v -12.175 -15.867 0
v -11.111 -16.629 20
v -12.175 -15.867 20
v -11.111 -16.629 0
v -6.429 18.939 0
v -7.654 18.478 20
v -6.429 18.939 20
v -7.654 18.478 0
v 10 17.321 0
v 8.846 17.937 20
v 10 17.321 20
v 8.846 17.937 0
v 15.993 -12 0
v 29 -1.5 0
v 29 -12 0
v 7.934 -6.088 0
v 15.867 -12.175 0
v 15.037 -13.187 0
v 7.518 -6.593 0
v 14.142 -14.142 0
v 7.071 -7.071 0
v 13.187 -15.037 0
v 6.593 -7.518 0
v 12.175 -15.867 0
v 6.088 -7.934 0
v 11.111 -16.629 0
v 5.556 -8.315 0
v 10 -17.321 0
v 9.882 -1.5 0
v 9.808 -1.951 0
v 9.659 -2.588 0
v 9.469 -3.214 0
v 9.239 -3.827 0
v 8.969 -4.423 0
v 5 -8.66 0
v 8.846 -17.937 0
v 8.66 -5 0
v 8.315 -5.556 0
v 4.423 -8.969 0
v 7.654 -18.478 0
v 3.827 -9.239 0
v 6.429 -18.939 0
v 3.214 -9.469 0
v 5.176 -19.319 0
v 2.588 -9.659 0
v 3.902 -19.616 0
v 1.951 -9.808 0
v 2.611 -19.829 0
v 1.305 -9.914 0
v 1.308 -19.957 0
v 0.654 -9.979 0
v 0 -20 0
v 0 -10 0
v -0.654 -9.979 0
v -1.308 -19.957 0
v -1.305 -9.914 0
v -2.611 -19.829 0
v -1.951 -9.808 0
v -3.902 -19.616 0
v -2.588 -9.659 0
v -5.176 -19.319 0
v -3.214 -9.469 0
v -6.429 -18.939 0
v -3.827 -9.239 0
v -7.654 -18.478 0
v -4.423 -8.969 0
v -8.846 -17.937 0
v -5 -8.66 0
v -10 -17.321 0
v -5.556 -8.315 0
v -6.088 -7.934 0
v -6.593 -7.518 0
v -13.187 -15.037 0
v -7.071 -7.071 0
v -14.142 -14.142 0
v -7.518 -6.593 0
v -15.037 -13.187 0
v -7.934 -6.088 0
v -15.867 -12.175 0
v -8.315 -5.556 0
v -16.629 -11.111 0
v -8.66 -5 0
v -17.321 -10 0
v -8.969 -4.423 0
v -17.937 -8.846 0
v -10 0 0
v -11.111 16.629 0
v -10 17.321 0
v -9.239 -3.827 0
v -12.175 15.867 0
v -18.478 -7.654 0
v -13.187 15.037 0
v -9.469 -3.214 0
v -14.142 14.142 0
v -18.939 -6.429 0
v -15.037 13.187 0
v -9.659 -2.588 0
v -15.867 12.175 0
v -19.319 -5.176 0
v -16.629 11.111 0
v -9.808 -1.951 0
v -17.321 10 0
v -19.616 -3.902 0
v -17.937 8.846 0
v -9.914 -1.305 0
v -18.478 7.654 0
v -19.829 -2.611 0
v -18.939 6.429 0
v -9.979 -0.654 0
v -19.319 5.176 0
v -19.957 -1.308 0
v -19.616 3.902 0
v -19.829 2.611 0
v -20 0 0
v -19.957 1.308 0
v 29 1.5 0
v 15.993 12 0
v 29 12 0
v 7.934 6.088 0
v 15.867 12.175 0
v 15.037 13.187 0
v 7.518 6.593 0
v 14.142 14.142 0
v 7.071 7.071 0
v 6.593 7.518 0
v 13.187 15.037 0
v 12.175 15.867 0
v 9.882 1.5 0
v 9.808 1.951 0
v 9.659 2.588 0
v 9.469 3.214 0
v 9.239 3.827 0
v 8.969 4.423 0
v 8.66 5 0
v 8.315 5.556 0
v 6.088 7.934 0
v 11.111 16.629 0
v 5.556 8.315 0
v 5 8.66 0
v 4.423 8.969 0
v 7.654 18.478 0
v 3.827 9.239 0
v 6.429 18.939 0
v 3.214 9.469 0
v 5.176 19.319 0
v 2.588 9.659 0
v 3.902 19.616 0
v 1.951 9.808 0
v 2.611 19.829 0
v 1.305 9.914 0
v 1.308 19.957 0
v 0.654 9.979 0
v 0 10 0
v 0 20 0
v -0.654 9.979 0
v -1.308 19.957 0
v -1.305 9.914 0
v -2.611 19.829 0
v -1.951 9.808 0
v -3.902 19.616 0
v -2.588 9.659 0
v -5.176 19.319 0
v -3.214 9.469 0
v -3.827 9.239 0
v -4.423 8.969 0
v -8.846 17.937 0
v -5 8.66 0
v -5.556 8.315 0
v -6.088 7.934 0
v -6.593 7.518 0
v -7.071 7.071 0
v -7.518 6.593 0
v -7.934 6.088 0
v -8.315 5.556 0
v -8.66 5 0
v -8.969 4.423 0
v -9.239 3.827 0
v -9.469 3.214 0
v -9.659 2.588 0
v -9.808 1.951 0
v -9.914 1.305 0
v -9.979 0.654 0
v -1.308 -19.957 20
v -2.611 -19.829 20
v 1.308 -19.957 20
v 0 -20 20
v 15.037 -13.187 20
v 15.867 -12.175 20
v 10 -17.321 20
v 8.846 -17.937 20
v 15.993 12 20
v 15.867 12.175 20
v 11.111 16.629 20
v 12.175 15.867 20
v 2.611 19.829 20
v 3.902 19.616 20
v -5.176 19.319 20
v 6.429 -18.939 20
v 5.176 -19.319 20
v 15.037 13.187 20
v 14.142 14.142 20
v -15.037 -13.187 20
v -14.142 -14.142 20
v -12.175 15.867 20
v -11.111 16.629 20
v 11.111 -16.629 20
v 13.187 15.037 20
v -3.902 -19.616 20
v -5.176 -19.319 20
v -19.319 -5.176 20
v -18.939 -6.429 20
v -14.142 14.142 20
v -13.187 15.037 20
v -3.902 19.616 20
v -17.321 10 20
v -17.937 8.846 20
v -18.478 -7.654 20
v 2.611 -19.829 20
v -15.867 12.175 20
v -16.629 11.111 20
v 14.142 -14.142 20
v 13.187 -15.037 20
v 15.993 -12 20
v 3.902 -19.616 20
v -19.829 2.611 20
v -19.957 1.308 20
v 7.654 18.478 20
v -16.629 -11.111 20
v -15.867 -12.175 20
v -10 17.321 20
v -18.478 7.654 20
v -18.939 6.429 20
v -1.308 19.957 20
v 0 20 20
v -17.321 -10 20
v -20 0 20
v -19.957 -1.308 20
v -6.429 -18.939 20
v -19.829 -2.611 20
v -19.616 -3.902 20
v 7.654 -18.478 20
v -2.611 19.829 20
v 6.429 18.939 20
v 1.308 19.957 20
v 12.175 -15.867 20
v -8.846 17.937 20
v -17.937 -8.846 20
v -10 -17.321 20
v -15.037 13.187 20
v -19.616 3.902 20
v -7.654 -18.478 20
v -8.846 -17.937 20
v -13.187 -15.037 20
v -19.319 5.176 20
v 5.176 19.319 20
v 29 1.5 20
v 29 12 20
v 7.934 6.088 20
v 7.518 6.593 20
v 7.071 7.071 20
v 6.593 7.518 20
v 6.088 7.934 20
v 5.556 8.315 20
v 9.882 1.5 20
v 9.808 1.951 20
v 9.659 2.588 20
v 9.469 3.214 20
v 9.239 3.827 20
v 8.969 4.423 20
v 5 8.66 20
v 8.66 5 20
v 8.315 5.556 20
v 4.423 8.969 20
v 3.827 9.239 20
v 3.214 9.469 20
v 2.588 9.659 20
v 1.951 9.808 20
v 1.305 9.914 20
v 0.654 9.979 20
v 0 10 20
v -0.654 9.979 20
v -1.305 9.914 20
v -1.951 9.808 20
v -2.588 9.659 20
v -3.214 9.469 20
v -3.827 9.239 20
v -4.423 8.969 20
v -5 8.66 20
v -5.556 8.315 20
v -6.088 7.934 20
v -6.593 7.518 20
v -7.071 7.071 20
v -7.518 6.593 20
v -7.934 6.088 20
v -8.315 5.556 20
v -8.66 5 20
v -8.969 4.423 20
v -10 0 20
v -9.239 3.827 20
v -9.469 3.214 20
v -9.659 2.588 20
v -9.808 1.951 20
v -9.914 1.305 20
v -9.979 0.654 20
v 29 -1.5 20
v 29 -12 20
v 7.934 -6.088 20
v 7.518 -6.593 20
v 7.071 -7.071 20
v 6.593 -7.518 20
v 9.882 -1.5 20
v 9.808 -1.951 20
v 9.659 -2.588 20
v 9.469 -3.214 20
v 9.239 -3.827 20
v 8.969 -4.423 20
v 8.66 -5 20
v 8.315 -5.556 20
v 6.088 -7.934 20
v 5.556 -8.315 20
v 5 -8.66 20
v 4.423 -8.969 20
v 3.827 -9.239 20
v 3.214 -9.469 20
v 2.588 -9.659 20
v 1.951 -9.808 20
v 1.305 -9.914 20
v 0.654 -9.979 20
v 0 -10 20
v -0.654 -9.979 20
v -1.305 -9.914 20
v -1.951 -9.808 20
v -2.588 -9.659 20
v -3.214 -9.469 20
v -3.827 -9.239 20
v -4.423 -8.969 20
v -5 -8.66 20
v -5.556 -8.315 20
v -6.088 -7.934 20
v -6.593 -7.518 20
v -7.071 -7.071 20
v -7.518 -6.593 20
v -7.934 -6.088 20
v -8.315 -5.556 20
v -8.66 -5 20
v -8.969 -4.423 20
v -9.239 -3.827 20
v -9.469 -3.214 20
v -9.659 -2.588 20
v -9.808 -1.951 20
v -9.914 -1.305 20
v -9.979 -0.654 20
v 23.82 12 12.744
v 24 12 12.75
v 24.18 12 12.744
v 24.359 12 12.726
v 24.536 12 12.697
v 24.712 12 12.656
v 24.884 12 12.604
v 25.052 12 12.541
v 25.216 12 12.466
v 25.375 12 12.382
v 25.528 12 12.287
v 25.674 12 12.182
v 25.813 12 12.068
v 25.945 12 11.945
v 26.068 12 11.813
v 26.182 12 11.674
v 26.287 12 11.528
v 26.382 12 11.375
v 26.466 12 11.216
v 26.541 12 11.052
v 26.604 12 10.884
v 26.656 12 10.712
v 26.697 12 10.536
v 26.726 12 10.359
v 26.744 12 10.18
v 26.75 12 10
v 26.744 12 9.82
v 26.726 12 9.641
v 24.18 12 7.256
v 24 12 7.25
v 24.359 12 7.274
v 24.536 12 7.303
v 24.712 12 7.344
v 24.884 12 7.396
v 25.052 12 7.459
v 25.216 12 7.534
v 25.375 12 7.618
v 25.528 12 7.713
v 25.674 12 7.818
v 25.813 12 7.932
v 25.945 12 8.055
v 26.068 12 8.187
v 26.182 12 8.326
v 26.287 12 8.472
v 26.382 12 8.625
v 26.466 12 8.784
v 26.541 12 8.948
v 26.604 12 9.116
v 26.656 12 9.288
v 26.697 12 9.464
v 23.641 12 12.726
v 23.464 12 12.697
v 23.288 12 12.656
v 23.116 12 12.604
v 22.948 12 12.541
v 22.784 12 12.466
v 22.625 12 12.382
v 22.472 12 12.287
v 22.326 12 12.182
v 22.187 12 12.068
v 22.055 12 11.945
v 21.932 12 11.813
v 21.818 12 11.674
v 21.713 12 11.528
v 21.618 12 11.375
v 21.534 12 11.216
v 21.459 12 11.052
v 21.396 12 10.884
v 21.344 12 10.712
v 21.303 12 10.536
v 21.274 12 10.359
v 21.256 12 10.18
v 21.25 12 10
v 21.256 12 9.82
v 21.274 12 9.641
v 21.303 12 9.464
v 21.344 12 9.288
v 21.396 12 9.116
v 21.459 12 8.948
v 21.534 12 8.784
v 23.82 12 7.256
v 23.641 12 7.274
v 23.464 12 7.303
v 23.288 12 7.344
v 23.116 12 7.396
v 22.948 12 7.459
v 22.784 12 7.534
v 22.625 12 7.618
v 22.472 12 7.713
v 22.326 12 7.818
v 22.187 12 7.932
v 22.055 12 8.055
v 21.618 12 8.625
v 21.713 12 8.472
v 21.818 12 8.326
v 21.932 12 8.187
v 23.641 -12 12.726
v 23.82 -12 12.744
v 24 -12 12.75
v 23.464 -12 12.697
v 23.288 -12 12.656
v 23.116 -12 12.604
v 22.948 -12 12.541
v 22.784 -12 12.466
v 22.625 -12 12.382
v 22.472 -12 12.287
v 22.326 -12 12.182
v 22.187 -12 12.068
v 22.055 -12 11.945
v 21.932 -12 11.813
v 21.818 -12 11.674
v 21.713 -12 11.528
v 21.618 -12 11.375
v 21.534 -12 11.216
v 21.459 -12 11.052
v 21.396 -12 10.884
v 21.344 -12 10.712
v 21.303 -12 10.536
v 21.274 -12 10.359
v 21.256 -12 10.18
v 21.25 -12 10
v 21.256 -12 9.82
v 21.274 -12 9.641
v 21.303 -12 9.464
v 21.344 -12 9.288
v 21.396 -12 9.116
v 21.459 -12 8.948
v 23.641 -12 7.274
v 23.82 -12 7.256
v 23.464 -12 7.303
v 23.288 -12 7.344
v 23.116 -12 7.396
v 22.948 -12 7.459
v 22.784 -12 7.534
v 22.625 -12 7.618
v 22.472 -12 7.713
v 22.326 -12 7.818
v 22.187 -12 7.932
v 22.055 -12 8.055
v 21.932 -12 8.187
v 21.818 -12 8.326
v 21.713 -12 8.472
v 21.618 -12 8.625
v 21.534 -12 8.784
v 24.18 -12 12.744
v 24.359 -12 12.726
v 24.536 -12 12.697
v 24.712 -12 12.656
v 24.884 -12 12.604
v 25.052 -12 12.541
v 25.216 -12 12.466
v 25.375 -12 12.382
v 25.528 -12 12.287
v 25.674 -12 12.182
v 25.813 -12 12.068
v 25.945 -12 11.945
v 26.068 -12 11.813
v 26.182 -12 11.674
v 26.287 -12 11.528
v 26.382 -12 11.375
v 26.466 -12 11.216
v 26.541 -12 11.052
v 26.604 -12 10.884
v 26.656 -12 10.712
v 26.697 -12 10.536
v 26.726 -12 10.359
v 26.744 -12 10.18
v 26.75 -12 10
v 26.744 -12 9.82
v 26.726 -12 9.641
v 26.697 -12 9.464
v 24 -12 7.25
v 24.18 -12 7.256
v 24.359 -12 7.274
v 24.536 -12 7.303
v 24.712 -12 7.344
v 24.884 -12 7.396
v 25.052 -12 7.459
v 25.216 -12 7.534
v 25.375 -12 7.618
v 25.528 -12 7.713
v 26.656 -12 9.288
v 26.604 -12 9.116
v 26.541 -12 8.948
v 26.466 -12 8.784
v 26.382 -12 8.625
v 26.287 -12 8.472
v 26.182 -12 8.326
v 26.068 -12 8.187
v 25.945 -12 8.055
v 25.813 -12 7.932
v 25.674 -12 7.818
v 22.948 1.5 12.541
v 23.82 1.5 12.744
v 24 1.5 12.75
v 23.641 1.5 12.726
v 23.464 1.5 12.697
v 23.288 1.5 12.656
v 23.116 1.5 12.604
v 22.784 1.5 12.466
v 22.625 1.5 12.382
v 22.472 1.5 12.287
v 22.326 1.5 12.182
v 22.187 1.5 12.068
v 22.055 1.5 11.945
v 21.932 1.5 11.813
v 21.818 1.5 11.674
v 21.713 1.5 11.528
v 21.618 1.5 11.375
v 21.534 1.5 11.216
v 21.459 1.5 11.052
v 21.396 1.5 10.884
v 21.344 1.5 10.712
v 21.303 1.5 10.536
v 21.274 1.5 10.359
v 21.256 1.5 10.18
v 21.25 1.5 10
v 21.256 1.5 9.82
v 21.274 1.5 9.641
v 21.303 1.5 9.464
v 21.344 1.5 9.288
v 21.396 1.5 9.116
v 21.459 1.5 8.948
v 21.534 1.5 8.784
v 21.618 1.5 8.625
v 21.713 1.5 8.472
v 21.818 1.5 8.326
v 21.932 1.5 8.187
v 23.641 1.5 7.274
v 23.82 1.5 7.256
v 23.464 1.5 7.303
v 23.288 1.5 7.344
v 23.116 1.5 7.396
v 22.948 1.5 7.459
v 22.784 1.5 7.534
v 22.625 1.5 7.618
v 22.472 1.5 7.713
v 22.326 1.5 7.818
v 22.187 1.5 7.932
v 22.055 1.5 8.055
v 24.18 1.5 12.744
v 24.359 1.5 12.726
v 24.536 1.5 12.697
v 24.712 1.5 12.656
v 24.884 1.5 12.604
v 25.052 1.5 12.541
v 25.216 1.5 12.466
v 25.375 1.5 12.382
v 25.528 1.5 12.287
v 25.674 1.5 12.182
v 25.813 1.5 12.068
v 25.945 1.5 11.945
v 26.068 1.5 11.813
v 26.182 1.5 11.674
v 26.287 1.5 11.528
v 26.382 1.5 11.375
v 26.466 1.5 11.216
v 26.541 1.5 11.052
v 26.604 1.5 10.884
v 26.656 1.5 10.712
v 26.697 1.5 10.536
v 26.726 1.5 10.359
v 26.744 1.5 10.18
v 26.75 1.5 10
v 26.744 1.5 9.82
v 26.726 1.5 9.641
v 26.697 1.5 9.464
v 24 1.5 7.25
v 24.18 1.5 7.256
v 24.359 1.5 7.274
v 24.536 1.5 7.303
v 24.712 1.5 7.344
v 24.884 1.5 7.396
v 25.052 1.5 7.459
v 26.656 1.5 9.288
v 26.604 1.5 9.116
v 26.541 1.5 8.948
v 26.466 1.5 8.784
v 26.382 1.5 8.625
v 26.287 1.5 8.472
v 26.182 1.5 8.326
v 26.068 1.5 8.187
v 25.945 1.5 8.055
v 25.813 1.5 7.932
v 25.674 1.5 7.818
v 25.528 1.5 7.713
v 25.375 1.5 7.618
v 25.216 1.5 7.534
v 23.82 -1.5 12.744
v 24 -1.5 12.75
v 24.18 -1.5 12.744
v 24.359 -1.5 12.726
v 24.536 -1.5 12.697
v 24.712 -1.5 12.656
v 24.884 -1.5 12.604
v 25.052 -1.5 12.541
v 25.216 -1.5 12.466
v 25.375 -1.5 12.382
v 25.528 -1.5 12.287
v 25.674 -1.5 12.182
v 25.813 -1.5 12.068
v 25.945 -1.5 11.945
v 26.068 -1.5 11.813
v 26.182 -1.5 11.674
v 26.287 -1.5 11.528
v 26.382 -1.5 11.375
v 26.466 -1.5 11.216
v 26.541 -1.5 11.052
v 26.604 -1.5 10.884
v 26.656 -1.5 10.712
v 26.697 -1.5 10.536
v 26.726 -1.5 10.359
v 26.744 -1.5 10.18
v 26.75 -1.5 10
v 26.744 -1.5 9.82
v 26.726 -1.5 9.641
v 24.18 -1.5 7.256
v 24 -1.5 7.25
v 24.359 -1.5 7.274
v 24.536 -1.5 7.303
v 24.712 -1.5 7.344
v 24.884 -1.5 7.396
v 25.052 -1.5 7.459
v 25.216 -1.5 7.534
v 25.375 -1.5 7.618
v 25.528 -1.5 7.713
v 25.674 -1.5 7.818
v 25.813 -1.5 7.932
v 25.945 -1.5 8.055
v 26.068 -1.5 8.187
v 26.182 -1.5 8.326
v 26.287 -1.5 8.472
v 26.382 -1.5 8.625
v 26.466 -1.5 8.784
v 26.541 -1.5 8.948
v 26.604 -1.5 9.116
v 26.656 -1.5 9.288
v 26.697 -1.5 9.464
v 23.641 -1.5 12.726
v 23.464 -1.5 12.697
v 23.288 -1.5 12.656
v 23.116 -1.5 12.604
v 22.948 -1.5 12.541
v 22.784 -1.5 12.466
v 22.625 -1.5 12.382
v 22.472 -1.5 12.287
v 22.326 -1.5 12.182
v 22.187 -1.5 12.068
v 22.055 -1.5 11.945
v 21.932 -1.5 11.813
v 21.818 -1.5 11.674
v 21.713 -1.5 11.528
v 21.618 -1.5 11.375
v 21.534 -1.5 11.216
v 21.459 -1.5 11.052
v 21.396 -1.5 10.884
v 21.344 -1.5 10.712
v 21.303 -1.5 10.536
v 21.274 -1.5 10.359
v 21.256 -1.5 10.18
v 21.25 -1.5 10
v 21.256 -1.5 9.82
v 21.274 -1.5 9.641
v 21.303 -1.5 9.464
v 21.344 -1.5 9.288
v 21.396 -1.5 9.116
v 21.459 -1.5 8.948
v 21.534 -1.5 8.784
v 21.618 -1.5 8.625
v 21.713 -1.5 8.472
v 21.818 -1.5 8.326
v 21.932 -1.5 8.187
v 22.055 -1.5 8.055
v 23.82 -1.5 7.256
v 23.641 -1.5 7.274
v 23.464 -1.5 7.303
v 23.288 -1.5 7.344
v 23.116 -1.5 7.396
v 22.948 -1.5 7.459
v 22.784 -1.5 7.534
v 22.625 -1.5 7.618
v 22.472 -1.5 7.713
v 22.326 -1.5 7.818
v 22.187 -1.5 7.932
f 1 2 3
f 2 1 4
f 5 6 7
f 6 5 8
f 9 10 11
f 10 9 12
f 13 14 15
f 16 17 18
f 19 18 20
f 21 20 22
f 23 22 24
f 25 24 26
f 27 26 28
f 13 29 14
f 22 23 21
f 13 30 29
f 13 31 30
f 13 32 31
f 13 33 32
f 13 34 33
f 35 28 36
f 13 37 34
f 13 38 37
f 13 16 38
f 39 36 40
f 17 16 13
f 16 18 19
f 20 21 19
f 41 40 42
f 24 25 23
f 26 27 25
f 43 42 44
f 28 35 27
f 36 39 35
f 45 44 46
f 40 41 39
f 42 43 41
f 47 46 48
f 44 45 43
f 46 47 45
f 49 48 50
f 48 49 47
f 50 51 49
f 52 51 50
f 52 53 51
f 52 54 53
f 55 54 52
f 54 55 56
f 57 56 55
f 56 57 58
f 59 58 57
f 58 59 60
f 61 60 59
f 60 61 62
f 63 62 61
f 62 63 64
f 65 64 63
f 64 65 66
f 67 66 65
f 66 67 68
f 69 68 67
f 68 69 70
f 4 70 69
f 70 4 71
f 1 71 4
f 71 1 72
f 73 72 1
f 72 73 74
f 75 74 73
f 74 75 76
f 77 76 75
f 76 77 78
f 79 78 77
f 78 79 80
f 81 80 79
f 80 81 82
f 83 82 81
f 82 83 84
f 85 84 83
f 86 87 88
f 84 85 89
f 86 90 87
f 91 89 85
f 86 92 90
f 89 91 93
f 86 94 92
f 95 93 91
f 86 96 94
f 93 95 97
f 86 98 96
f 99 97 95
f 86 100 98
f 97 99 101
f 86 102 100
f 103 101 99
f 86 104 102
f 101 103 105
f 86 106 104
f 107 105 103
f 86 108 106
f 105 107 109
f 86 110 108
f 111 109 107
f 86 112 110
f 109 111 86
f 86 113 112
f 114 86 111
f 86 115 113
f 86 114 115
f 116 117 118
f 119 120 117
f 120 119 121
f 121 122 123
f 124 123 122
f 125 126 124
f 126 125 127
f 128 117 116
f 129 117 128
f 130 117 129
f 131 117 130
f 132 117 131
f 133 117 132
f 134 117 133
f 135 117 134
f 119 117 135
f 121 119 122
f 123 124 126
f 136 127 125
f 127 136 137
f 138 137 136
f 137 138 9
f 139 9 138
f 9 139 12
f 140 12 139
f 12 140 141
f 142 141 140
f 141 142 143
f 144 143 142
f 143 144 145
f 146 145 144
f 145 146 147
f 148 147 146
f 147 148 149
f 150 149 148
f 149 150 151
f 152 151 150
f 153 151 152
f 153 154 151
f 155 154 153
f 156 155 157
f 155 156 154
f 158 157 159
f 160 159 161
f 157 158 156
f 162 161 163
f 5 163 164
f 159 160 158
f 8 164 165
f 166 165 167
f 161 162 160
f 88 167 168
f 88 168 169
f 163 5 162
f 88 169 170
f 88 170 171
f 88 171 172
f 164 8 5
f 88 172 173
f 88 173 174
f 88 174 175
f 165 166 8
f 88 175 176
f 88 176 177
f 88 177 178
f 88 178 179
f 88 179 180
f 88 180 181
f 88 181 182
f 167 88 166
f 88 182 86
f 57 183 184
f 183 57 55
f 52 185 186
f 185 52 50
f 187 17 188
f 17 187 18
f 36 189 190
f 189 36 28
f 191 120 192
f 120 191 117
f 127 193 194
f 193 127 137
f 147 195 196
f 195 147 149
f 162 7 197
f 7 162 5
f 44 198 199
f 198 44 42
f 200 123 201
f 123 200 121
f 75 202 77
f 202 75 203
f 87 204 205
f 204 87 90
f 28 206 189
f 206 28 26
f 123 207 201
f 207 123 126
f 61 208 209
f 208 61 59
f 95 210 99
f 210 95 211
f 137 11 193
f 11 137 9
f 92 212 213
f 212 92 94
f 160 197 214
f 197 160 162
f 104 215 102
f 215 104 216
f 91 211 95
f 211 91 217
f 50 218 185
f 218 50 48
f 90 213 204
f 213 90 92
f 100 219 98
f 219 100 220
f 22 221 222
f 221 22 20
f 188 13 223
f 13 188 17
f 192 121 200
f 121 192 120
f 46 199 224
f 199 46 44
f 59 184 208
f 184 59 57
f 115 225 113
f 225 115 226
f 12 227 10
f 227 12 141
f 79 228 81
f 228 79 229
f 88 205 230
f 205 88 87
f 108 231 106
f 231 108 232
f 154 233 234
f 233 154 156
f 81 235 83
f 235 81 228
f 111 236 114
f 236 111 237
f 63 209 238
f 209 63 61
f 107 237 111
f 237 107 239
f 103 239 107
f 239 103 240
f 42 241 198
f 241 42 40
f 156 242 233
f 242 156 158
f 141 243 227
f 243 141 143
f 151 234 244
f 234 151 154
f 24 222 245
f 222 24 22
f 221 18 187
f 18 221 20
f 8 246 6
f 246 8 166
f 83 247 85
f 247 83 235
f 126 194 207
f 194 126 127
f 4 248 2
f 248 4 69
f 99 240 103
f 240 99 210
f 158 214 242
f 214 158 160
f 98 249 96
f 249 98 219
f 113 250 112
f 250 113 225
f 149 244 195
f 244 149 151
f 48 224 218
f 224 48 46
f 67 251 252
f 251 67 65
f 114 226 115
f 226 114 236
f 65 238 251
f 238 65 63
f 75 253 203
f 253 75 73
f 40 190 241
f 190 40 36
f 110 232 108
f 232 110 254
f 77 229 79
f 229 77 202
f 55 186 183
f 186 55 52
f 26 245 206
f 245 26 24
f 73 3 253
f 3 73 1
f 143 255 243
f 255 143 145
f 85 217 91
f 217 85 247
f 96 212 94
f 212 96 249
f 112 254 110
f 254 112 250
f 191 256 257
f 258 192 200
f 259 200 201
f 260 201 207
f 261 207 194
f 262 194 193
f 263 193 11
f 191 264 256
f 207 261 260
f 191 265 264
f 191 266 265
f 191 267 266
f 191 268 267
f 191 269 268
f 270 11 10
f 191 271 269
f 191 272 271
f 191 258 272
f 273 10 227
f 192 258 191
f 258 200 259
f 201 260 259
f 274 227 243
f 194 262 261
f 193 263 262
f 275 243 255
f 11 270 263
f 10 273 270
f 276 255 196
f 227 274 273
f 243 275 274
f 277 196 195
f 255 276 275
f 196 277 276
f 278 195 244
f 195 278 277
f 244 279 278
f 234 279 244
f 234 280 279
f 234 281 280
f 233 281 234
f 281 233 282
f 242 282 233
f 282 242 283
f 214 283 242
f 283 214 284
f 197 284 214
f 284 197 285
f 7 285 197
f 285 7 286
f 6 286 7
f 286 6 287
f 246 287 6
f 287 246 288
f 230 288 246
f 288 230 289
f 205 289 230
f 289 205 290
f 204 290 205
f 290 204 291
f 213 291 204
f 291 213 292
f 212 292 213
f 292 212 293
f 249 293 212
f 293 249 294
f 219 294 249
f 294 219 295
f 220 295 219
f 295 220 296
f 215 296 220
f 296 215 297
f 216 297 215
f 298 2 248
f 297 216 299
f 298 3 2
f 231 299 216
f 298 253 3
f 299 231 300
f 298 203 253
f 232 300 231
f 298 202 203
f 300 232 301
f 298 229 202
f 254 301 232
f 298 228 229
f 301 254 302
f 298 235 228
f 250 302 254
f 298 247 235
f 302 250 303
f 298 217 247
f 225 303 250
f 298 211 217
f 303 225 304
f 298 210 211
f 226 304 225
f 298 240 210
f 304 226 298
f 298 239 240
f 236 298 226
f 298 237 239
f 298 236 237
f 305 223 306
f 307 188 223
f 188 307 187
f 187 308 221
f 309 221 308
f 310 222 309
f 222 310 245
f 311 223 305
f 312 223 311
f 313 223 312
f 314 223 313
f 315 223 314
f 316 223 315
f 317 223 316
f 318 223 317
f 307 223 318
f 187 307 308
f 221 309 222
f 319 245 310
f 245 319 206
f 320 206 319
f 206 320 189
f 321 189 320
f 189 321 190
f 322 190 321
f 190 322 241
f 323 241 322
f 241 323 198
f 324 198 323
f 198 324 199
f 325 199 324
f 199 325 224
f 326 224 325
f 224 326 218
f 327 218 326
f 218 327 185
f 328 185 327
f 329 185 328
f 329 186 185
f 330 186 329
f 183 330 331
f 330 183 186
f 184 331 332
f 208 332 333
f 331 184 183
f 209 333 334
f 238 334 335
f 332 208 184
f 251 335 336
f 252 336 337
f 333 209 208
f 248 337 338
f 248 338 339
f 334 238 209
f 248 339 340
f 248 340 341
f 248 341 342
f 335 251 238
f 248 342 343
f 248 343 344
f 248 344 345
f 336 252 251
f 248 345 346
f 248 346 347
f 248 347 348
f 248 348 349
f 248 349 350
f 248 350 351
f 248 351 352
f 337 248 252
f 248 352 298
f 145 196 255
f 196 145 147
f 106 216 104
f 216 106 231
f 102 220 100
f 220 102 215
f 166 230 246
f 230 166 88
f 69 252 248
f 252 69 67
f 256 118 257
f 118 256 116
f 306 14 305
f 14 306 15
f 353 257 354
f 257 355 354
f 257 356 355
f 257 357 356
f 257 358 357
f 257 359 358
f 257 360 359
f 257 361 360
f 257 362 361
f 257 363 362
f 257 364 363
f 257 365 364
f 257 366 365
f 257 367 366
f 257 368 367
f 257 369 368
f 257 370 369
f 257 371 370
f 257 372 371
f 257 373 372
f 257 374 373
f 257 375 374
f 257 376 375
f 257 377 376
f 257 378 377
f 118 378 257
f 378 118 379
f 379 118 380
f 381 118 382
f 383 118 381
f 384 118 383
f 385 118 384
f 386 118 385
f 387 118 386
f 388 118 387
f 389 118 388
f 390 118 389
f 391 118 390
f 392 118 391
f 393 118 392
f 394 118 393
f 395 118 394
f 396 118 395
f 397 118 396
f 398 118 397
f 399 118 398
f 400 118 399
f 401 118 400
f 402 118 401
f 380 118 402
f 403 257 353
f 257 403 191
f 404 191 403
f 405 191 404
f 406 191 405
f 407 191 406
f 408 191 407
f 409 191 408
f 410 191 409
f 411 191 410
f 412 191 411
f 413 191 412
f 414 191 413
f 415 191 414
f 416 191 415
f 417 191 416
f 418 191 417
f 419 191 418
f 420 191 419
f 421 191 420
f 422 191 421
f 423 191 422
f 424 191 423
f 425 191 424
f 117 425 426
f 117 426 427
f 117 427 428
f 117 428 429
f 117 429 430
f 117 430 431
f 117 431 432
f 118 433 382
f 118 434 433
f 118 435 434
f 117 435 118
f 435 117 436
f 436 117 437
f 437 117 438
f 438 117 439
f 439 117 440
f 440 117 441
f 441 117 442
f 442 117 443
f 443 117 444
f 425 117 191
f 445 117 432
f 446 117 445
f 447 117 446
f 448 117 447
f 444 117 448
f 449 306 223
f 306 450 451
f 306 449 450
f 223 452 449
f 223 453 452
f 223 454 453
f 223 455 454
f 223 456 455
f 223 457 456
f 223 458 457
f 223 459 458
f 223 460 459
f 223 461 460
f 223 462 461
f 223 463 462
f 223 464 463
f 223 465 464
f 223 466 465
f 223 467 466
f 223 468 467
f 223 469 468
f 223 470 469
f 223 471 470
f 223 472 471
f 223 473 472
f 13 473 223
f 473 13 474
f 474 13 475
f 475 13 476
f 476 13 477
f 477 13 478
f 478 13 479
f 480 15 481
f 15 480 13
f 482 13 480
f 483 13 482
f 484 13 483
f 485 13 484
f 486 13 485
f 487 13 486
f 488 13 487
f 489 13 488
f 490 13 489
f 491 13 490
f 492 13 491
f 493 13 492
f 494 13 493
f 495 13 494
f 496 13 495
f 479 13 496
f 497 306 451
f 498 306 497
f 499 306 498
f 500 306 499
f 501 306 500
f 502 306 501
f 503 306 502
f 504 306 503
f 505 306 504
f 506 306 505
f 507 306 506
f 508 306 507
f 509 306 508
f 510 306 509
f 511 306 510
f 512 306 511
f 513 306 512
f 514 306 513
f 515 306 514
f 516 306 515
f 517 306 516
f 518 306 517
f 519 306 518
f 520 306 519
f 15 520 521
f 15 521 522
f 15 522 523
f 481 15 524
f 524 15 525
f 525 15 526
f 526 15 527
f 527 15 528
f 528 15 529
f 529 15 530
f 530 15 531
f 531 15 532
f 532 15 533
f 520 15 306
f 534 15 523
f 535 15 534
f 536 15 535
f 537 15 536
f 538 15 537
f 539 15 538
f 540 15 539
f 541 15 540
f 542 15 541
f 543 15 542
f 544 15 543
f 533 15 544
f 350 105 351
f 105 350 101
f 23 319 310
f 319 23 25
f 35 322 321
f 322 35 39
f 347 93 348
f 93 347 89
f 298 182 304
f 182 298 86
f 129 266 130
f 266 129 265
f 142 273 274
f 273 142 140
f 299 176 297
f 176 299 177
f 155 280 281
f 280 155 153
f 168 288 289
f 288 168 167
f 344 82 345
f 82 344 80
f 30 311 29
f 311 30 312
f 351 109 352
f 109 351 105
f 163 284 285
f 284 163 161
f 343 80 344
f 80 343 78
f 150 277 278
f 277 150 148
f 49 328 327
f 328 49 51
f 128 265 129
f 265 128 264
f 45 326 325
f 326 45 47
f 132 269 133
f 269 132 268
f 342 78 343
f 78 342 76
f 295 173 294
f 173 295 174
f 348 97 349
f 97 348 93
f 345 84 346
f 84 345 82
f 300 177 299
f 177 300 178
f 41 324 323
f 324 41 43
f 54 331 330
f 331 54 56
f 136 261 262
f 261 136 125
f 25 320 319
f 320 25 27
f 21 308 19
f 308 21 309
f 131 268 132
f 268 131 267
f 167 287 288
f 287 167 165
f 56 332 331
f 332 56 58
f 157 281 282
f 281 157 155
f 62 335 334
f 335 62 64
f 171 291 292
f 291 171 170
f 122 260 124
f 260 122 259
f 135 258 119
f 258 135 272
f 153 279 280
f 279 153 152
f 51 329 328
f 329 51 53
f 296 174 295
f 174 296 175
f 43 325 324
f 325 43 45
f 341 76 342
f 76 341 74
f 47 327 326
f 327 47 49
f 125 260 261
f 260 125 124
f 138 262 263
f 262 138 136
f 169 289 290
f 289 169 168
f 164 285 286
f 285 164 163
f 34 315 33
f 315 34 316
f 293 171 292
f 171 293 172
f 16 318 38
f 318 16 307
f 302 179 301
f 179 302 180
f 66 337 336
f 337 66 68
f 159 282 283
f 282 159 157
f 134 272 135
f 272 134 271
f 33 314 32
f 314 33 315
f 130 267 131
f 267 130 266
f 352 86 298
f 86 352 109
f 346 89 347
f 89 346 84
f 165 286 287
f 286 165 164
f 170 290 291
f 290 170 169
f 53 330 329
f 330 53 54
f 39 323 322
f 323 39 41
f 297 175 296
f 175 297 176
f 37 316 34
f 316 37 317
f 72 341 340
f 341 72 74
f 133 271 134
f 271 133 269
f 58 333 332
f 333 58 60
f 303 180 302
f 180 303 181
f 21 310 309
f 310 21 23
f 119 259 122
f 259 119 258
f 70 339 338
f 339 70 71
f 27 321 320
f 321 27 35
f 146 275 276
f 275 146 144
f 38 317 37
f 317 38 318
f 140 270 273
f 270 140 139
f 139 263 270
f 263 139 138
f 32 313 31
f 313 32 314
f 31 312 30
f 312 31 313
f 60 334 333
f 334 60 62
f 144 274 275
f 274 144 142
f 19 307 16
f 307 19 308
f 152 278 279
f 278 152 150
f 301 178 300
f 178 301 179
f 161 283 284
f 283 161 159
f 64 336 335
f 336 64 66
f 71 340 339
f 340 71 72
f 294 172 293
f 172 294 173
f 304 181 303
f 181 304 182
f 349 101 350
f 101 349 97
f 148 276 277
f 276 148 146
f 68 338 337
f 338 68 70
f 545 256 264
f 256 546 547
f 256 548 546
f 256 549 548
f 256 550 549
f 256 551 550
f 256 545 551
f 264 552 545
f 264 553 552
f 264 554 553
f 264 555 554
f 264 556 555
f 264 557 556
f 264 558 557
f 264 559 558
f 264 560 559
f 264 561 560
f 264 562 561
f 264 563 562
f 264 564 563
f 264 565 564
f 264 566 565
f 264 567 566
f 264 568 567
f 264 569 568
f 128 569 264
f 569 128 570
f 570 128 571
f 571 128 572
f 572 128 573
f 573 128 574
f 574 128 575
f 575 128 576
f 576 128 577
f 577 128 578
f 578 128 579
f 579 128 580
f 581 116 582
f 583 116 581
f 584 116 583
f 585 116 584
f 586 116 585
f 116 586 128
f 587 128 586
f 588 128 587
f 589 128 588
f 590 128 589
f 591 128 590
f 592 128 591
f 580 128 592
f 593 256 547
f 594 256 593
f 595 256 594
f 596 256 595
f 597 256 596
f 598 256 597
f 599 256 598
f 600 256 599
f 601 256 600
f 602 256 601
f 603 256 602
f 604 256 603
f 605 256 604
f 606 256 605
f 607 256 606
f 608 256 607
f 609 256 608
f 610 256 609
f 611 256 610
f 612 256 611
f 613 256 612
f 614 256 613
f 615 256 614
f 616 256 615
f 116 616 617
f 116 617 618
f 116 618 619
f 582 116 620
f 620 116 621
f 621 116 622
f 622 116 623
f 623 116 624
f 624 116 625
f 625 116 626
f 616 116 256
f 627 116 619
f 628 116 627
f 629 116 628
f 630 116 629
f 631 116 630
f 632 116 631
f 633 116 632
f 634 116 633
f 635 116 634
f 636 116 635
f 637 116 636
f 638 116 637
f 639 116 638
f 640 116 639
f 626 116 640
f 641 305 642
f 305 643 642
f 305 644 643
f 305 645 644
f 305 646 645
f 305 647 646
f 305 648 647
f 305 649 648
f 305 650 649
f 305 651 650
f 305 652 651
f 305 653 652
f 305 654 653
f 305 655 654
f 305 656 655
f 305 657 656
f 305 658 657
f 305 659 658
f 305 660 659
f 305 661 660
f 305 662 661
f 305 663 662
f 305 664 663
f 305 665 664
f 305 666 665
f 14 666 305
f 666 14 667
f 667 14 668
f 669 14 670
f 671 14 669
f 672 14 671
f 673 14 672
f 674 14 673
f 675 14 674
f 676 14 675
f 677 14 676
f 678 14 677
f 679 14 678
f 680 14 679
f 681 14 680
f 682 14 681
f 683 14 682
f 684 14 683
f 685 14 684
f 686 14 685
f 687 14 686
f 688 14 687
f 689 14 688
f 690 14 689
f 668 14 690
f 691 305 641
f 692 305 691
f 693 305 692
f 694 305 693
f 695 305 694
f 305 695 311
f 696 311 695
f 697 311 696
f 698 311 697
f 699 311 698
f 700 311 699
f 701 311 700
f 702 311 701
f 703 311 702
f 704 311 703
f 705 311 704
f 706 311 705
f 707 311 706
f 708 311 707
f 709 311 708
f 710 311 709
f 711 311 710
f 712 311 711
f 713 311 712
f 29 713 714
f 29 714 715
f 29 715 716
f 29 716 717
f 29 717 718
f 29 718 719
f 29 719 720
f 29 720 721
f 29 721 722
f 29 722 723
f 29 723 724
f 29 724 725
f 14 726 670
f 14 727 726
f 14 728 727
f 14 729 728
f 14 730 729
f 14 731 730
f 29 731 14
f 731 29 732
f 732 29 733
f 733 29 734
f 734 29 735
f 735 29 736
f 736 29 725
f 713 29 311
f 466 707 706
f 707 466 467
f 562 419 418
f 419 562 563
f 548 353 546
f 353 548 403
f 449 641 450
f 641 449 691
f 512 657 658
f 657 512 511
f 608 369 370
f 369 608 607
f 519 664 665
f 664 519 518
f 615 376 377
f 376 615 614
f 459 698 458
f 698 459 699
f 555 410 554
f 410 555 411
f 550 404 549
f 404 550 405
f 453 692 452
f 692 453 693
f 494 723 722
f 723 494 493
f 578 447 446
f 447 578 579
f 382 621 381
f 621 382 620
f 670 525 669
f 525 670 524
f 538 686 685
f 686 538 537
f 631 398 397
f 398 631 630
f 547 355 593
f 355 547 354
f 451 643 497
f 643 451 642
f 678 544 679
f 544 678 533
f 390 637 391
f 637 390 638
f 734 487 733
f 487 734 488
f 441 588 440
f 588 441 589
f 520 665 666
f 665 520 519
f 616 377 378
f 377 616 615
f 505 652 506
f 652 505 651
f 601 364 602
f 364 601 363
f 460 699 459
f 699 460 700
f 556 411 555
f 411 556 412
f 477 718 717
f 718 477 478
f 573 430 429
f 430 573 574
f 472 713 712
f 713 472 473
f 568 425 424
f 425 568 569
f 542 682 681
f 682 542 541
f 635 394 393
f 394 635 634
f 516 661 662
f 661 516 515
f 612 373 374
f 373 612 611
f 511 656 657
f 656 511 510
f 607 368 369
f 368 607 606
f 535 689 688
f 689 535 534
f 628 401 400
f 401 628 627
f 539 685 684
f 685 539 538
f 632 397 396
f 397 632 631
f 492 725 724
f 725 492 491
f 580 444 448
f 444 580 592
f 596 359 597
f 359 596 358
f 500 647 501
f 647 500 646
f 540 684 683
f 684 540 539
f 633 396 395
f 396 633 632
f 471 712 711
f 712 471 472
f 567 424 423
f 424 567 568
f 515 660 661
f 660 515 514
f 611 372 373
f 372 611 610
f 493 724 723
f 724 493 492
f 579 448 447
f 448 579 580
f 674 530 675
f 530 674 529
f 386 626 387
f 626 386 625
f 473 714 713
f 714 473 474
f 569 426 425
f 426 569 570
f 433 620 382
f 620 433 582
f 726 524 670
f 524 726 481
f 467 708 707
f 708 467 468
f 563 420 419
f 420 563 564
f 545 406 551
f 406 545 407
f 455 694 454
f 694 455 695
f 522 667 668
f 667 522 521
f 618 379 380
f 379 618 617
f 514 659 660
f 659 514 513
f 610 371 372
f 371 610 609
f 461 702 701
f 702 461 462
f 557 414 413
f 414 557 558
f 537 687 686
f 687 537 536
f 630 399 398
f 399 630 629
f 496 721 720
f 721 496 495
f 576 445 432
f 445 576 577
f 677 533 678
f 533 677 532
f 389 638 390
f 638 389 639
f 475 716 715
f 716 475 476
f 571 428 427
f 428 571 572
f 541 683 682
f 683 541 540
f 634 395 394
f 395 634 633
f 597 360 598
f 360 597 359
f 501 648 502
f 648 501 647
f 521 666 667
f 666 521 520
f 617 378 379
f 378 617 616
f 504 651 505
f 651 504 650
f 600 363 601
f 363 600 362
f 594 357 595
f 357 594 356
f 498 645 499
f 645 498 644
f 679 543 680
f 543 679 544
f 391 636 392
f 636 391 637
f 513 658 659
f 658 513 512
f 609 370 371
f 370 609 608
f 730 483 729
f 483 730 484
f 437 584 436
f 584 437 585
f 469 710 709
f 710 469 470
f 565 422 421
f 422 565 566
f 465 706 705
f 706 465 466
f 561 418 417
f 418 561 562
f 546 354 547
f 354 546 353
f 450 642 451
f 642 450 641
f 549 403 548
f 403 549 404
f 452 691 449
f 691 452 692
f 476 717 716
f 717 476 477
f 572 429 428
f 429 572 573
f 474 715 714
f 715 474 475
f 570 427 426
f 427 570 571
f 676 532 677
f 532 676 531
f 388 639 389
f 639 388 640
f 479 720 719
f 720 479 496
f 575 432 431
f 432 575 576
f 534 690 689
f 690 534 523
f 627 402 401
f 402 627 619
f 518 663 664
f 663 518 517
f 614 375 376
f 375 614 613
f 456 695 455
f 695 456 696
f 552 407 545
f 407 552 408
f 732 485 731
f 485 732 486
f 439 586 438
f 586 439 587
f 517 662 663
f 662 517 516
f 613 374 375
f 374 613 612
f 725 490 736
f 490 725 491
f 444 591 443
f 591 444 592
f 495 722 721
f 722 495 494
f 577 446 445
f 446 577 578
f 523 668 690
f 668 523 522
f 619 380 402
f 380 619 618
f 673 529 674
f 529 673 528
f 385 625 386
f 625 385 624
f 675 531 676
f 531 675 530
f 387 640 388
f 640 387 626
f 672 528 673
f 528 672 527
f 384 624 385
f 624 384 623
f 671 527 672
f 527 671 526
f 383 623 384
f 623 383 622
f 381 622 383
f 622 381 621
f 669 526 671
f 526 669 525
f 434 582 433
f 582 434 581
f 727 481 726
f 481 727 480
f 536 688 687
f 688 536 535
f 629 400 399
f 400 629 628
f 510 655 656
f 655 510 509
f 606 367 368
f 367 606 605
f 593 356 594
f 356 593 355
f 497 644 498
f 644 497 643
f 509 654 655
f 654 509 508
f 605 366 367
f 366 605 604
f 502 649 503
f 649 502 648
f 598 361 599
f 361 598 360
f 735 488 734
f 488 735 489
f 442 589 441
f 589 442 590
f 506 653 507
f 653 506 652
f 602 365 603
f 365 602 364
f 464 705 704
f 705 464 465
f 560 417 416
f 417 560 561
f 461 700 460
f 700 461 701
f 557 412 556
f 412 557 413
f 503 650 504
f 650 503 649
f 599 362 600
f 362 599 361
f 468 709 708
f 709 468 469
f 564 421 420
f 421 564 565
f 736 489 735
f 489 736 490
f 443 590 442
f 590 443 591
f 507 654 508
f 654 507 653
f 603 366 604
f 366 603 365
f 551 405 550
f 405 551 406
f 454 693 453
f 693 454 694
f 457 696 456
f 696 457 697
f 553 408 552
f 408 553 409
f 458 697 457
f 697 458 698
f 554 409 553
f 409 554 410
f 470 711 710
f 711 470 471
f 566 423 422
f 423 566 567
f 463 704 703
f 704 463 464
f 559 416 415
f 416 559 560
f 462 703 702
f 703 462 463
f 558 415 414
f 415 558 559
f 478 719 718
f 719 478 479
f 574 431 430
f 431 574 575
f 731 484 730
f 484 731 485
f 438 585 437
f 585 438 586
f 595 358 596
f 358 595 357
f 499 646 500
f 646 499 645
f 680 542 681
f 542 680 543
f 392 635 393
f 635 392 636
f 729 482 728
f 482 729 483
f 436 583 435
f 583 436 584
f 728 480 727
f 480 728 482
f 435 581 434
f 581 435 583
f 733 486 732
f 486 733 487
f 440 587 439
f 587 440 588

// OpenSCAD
// t3-010 split shaft collar
$fn = 96;
body_diameter = 40;
body_height = 20;
bore_diameter = 20;
lug_x0 = 15;
lug_x1 = 29;
lug_half_y = 12;
slit_width = 3;
bolt_hole_diameter = 5.5;
bolt_x = 24;

difference() {
    union() {
        cylinder(d = body_diameter, h = body_height);
        translate([lug_x0, -lug_half_y, 0]) cube([lug_x1 - lug_x0, 2 * lug_half_y, body_height]);
    }
    translate([0, 0, -1]) cylinder(d = bore_diameter, h = body_height + 2);
    translate([0, -slit_width / 2, -1]) cube([lug_x1 + 1, slit_width, body_height + 2]);
    translate([bolt_x, lug_half_y + 1, body_height / 2]) rotate([90, 0, 0])
        cylinder(d = bolt_hole_diameter, h = 2 * lug_half_y + 2);
}
